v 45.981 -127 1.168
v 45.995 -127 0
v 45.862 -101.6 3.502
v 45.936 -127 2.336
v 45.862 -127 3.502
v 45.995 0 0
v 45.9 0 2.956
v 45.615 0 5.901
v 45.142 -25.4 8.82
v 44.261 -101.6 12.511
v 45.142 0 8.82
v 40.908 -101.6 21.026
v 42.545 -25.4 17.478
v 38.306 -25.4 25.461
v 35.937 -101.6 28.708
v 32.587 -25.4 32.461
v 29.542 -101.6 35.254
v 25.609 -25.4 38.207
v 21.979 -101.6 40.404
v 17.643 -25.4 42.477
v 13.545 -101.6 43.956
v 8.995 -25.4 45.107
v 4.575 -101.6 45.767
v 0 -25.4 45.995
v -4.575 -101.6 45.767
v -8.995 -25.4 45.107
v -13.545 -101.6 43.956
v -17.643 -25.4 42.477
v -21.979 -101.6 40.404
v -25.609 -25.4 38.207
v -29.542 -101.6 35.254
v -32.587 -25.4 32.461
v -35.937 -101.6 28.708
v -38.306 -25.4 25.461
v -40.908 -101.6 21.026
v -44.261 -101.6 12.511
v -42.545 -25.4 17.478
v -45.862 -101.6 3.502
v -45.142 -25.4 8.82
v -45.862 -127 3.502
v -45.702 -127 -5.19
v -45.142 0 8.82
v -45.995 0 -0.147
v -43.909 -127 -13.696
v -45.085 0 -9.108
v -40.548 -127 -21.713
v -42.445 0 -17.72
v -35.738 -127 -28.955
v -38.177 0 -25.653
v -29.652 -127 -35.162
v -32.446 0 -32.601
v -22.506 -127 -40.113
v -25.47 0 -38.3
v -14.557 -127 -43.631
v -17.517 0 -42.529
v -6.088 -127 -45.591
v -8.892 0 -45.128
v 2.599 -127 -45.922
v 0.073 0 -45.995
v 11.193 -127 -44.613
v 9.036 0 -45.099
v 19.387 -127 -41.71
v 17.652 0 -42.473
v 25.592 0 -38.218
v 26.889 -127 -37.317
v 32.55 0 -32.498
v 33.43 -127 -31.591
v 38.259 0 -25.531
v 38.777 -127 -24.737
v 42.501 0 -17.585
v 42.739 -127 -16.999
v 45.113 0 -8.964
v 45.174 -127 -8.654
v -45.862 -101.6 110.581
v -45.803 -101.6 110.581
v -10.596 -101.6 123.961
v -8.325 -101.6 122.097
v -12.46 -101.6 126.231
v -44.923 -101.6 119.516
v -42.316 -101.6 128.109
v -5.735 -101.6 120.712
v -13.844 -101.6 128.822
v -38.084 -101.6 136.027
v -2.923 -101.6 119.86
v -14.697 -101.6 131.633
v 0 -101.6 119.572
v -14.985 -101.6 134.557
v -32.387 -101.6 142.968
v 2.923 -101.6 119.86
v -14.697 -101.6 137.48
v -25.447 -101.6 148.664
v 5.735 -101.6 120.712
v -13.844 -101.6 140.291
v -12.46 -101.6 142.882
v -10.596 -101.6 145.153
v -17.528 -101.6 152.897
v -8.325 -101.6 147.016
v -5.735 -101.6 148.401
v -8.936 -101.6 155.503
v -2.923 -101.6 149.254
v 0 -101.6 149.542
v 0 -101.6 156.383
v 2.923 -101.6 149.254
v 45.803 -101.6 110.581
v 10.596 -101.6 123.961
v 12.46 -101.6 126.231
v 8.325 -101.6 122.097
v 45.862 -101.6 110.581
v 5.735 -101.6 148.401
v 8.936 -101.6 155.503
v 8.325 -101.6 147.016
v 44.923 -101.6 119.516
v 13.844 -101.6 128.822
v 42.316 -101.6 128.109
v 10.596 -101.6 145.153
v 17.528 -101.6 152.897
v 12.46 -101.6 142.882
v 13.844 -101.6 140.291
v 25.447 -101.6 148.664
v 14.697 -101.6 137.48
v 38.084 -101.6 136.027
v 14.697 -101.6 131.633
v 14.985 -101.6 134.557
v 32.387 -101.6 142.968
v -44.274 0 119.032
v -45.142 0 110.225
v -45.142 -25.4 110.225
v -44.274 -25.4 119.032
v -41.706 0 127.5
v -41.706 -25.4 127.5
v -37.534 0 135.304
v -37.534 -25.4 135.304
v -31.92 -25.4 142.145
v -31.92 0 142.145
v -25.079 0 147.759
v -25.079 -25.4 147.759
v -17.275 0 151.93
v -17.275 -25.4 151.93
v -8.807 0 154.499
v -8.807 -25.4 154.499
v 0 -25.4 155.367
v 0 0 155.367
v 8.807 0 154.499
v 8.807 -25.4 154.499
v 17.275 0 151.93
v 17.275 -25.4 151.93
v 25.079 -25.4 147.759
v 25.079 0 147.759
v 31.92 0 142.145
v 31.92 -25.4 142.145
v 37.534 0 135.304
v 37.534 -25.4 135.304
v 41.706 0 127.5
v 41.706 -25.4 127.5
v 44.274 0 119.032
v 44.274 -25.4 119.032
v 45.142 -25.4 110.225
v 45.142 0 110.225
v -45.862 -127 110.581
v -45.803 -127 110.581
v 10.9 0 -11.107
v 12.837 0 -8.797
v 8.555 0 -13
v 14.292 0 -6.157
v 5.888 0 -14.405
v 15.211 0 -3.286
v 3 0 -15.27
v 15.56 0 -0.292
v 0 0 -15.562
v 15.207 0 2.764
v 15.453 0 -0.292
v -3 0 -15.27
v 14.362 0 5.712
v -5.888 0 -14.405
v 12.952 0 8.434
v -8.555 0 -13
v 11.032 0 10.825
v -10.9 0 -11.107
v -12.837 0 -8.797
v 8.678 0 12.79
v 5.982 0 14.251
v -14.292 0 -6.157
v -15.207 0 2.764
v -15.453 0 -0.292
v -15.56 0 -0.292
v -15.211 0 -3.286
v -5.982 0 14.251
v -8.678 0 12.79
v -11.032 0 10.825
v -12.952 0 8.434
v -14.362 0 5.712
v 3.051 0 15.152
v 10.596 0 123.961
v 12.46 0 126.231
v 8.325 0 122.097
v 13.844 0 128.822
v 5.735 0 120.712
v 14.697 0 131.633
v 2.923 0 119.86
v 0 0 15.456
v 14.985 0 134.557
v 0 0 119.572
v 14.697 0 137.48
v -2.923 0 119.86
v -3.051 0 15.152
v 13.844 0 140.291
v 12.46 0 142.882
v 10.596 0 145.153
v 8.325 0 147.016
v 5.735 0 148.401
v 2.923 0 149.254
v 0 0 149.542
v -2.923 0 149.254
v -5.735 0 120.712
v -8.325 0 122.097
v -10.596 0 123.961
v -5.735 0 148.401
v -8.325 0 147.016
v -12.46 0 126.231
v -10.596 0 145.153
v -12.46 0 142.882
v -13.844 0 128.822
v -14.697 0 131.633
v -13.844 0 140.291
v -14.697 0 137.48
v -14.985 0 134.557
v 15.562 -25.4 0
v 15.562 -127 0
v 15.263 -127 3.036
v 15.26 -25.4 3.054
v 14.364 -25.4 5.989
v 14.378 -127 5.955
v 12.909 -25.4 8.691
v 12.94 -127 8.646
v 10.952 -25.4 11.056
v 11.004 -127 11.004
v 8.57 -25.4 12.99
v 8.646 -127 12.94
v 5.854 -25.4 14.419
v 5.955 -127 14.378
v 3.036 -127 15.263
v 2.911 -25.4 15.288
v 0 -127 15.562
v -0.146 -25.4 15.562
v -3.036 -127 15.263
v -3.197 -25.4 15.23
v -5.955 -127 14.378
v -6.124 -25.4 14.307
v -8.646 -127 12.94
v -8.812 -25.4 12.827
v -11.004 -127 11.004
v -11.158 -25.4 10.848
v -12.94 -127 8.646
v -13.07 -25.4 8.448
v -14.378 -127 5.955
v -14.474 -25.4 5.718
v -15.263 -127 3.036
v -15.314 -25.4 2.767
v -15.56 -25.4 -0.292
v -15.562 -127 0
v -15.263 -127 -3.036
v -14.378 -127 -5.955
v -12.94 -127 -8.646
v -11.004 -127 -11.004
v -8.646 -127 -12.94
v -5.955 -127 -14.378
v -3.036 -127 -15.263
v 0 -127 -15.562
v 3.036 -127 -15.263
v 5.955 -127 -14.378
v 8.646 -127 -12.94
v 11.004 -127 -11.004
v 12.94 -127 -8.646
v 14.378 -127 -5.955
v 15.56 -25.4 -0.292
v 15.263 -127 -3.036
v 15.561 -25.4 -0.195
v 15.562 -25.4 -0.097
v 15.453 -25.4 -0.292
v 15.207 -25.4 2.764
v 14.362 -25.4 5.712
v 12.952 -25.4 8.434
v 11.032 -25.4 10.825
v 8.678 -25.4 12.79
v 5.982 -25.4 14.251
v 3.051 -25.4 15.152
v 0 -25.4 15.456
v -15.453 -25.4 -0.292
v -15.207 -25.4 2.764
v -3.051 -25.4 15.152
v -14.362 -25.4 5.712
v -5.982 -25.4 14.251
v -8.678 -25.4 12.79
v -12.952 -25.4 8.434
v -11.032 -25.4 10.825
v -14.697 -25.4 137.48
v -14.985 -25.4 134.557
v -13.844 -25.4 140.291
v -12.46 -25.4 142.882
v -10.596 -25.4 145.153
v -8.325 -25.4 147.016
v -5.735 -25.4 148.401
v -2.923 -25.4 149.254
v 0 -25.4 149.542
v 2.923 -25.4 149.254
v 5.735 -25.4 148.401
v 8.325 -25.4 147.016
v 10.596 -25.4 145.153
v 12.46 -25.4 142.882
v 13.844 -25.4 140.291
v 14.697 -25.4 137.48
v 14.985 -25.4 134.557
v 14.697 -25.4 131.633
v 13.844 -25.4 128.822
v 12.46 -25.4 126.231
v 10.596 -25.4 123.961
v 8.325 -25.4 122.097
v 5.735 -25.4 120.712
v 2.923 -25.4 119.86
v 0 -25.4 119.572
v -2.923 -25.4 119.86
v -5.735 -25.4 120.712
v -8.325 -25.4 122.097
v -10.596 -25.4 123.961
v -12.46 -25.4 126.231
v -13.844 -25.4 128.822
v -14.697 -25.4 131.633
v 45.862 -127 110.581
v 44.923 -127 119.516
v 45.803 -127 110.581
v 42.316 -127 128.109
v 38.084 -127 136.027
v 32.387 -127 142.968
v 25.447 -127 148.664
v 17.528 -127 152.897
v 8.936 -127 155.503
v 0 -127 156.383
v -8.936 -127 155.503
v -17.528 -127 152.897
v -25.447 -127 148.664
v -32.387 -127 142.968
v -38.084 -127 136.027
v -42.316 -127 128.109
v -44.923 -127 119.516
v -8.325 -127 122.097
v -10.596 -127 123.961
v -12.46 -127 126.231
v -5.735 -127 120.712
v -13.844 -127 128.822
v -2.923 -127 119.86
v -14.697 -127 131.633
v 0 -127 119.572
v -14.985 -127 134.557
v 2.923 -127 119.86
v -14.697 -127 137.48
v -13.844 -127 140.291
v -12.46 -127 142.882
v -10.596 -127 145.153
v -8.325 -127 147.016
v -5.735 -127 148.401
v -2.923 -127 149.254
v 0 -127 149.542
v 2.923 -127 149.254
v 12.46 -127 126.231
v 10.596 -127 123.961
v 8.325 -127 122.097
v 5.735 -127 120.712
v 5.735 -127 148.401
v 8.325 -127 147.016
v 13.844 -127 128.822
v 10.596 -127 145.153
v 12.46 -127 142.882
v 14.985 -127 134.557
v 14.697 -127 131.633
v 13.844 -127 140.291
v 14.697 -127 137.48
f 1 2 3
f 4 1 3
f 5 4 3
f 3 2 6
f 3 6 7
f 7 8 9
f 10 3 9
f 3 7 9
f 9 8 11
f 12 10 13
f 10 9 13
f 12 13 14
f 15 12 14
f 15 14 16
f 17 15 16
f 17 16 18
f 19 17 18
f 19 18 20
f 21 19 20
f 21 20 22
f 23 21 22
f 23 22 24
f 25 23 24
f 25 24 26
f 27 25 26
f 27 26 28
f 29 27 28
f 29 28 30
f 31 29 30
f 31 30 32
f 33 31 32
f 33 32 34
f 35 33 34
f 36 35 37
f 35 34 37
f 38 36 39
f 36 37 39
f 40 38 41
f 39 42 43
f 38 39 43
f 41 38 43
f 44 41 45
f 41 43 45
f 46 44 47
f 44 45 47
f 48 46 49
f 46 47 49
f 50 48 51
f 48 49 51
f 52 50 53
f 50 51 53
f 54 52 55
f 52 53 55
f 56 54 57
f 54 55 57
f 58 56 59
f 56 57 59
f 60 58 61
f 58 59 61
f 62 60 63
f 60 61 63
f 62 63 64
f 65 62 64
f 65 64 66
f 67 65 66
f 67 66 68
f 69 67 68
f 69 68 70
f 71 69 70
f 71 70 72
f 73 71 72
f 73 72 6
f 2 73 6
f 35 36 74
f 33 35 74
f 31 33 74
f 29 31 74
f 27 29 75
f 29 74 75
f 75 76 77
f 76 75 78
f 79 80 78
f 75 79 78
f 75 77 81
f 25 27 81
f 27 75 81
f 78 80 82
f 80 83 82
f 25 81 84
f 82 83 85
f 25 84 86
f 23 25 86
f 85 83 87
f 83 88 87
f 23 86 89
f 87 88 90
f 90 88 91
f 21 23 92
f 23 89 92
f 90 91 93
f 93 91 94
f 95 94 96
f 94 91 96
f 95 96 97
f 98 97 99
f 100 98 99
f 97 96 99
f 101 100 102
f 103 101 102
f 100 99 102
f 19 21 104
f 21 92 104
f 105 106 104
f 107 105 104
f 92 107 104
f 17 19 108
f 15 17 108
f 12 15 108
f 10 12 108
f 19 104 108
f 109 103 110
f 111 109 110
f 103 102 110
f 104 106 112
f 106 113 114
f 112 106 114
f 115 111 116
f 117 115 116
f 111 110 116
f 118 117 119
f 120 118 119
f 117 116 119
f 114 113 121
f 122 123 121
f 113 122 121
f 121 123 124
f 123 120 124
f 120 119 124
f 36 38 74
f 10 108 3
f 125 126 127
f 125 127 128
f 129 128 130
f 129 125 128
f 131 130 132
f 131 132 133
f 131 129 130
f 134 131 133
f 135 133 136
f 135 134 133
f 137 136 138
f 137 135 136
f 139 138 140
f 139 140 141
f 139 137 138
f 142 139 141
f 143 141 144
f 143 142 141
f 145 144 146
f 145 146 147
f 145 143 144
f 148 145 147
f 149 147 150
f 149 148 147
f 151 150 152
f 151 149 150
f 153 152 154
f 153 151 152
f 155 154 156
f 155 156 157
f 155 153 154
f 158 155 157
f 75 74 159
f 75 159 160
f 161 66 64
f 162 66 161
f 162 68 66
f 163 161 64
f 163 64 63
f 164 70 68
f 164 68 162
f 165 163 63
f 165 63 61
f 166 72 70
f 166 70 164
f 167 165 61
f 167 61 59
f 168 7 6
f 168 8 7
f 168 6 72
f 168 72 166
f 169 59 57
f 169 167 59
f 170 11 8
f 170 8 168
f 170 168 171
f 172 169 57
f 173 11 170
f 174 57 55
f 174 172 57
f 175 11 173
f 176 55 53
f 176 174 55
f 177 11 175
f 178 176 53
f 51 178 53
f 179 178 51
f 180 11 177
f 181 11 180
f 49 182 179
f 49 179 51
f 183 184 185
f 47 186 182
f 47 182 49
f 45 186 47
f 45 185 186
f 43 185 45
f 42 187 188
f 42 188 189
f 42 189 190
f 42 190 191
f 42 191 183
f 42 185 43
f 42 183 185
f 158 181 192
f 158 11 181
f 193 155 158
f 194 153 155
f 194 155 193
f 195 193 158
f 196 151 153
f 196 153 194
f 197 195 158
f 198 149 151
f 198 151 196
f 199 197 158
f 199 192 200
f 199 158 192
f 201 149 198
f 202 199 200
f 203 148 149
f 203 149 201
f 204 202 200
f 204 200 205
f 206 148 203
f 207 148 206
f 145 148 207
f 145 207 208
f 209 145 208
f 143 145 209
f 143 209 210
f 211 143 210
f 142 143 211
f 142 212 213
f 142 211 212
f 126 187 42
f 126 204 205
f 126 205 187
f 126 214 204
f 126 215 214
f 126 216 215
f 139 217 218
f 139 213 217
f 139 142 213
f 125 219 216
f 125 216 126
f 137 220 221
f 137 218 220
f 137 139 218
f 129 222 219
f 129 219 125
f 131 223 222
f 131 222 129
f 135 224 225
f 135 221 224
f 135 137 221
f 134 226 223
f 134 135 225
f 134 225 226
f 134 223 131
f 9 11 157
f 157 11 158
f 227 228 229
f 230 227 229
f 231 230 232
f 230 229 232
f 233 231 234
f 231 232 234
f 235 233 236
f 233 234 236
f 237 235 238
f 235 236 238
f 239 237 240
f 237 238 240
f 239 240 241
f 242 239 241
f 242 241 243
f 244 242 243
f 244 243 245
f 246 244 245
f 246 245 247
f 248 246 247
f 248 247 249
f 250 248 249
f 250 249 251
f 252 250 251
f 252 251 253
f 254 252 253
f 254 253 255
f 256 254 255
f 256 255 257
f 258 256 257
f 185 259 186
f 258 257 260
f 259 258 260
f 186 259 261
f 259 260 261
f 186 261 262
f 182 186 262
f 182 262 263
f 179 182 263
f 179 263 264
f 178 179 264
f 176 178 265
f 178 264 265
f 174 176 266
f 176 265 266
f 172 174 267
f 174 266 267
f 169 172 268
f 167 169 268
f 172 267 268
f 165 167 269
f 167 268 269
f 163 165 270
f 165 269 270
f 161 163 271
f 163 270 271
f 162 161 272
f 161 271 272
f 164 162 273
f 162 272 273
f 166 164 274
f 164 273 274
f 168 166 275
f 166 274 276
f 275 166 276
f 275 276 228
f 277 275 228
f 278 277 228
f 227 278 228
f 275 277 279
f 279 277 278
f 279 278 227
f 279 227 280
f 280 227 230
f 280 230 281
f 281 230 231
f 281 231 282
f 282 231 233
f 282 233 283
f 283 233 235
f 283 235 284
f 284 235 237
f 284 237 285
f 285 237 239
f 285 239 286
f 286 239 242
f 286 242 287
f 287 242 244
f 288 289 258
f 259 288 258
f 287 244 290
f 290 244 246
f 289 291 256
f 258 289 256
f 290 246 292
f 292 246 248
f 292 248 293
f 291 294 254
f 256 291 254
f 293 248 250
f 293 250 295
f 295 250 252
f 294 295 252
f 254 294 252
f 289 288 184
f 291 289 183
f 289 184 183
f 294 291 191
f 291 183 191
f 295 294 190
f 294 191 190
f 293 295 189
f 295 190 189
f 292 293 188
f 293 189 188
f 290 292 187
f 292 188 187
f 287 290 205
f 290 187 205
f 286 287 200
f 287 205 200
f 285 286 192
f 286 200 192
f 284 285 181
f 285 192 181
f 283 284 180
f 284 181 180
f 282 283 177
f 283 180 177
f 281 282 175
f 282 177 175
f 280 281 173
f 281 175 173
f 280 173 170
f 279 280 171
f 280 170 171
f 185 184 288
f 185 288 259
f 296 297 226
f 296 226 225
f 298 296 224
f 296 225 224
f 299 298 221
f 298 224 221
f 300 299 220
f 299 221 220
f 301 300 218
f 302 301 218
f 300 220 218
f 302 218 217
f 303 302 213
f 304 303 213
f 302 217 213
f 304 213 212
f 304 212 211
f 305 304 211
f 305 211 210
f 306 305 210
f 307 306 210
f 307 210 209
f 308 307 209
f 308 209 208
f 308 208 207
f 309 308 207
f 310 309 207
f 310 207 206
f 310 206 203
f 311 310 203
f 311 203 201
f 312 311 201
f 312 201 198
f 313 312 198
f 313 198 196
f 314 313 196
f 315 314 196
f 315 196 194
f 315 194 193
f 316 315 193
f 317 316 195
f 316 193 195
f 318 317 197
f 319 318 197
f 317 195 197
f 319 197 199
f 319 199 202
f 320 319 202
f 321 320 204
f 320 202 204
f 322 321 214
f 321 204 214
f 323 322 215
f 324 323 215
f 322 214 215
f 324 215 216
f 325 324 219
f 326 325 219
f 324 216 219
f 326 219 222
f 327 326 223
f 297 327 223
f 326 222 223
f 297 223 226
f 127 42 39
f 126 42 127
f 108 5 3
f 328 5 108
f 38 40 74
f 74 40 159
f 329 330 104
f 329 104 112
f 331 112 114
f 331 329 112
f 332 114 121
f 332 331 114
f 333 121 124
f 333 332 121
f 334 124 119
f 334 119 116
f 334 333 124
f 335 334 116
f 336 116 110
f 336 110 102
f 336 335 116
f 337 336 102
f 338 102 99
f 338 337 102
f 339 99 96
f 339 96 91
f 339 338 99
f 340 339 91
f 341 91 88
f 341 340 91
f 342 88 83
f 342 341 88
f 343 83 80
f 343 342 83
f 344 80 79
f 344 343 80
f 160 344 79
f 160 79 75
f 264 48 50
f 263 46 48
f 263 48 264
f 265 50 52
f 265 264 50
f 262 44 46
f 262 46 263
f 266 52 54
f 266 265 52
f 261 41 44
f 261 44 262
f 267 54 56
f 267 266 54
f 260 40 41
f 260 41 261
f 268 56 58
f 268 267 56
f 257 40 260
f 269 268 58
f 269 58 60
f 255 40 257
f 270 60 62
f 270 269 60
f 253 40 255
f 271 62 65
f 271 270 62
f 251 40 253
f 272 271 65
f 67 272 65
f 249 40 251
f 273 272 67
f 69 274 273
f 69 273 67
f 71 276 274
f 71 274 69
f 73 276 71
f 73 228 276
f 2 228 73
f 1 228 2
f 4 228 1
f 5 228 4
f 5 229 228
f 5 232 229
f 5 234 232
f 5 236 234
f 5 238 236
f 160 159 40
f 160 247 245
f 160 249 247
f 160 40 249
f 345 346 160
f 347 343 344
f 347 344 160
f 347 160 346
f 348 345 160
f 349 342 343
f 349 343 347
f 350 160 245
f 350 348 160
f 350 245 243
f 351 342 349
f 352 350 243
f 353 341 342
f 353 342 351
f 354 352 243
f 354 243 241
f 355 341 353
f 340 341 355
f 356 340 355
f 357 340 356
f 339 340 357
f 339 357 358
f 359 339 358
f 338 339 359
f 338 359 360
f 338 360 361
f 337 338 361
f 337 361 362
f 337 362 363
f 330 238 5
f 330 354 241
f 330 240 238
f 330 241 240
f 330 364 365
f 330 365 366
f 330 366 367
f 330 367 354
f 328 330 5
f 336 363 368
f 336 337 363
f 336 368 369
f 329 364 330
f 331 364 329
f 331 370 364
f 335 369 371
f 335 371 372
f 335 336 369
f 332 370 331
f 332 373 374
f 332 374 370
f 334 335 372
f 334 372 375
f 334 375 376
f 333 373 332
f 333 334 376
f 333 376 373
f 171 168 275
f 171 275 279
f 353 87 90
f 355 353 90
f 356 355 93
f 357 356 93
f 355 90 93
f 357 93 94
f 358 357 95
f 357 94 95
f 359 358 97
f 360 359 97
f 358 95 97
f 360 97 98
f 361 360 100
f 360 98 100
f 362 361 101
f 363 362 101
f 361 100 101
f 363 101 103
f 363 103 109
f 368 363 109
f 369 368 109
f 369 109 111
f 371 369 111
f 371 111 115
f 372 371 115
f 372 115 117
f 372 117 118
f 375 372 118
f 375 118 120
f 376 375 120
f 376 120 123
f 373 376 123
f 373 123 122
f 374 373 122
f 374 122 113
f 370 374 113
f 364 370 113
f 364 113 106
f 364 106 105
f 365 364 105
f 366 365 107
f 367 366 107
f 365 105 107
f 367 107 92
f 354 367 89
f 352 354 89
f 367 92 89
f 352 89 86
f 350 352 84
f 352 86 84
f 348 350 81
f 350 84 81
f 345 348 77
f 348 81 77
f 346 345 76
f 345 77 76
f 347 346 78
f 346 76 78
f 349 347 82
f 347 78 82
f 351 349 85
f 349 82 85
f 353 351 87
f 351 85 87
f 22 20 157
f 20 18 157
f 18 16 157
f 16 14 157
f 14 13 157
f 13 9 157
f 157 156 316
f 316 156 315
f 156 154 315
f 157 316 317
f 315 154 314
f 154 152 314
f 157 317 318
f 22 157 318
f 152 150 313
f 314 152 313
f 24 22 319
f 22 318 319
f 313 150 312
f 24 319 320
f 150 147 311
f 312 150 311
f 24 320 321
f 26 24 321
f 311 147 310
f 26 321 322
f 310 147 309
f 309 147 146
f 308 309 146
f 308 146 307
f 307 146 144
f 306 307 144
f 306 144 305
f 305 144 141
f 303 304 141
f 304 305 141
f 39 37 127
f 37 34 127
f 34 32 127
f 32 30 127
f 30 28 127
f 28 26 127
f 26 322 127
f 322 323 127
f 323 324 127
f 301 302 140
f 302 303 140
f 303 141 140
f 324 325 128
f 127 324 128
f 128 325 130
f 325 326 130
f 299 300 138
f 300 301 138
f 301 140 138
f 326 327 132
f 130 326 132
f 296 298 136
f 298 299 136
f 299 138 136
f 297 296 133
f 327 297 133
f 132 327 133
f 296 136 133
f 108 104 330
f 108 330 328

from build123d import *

# Parameters (mm, degrees)
F0_R      = 45.9953933043
F1_DEPTH  = 127
F2_R      = 15.5126771319
F3_DEPTH  = 127
F4_W      = 91.7238295078
F4_H      = 110.3479489684
F5_DEPTH  = 25.4
F6_R      = 15.5623091615
F7_DEPTH  = 127
F8_R      = 45.8026969915
F9_DEPTH  = 25.4
F10_W     = 90.2835130692
F10_H     = 110.5170249939
F11_DEPTH = 25.4
F12_R     = 15.4559946756
F13_DEPTH = 127
F15_DEPTH = 25.4
F16_R     = 14.9850437789
F17_DEPTH = 127


with BuildPart() as f1:
    # F0 (on Front) → F1 (new body)
    with BuildSketch(Plane.XZ):
        Circle(F0_R)
    extrude(amount=F1_DEPTH)

    # F2 (on Front) → F3 (cut)
    with BuildSketch(Plane.XZ):
        Circle(F2_R)
    extrude(amount=F3_DEPTH, mode=Mode.SUBTRACT)

    # F4 (on face) → F5 (join)
    with BuildSketch(Plane.XZ.offset(127)):
        with Locations((0, 55.4068051279)):
            Rectangle(F4_W, F4_H)
    extrude(amount=-F5_DEPTH)

    # F6 (on face) → F7 (cut)
    with BuildSketch(Plane.XZ.offset(127)):
        Circle(F6_R)
    extrude(amount=-F7_DEPTH, mode=Mode.SUBTRACT)

    # F8 (on face) → F9 (join)
    with BuildSketch(Plane.XZ.offset(127)):
        with Locations((0, 110.5807796121)):
            Circle(F8_R)
    extrude(amount=-F9_DEPTH)

    # F10 (on face) → F11 (join)
    with BuildSketch(Plane(origin=(0, 0, 0), x_dir=(-1, 0, 0), z_dir=(0, 1, 0))):
        with Locations((0, 54.9663677812)):
            Rectangle(F10_W, F10_H)
    extrude(amount=-F11_DEPTH)

    # F12 (on face) → F13 (cut)
    with BuildSketch(Plane(origin=(0, 0, 0), x_dir=(-1, 0, 0), z_dir=(0, 1, 0))):
        Circle(F12_R)
    extrude(amount=-F13_DEPTH, mode=Mode.SUBTRACT)

    # F14 (on face) → F15 (join)
    with BuildSketch(Plane(origin=(0, 0, 0), x_dir=(-1, 0, 0), z_dir=(0, 1, 0))):
        with BuildLine():
            Line((-45.1417565346, 110.2248802781), (45.1417565346, 110.2248802781))
            ThreePointArc((45.1417565346, 110.2248802781), (0, 155.3666368127), (-45.1417565346, 110.2248802781))
        make_face()
    extrude(amount=-F15_DEPTH)

    # F16 (on face) → F17 (cut)
    with BuildSketch(Plane(origin=(0, 0, 0), x_dir=(-1, 0, 0), z_dir=(0, 1, 0))):
        with Locations((0, 134.5566511154)):
            Circle(F16_R)
    extrude(amount=-F17_DEPTH, mode=Mode.SUBTRACT)


solid = f1.part
